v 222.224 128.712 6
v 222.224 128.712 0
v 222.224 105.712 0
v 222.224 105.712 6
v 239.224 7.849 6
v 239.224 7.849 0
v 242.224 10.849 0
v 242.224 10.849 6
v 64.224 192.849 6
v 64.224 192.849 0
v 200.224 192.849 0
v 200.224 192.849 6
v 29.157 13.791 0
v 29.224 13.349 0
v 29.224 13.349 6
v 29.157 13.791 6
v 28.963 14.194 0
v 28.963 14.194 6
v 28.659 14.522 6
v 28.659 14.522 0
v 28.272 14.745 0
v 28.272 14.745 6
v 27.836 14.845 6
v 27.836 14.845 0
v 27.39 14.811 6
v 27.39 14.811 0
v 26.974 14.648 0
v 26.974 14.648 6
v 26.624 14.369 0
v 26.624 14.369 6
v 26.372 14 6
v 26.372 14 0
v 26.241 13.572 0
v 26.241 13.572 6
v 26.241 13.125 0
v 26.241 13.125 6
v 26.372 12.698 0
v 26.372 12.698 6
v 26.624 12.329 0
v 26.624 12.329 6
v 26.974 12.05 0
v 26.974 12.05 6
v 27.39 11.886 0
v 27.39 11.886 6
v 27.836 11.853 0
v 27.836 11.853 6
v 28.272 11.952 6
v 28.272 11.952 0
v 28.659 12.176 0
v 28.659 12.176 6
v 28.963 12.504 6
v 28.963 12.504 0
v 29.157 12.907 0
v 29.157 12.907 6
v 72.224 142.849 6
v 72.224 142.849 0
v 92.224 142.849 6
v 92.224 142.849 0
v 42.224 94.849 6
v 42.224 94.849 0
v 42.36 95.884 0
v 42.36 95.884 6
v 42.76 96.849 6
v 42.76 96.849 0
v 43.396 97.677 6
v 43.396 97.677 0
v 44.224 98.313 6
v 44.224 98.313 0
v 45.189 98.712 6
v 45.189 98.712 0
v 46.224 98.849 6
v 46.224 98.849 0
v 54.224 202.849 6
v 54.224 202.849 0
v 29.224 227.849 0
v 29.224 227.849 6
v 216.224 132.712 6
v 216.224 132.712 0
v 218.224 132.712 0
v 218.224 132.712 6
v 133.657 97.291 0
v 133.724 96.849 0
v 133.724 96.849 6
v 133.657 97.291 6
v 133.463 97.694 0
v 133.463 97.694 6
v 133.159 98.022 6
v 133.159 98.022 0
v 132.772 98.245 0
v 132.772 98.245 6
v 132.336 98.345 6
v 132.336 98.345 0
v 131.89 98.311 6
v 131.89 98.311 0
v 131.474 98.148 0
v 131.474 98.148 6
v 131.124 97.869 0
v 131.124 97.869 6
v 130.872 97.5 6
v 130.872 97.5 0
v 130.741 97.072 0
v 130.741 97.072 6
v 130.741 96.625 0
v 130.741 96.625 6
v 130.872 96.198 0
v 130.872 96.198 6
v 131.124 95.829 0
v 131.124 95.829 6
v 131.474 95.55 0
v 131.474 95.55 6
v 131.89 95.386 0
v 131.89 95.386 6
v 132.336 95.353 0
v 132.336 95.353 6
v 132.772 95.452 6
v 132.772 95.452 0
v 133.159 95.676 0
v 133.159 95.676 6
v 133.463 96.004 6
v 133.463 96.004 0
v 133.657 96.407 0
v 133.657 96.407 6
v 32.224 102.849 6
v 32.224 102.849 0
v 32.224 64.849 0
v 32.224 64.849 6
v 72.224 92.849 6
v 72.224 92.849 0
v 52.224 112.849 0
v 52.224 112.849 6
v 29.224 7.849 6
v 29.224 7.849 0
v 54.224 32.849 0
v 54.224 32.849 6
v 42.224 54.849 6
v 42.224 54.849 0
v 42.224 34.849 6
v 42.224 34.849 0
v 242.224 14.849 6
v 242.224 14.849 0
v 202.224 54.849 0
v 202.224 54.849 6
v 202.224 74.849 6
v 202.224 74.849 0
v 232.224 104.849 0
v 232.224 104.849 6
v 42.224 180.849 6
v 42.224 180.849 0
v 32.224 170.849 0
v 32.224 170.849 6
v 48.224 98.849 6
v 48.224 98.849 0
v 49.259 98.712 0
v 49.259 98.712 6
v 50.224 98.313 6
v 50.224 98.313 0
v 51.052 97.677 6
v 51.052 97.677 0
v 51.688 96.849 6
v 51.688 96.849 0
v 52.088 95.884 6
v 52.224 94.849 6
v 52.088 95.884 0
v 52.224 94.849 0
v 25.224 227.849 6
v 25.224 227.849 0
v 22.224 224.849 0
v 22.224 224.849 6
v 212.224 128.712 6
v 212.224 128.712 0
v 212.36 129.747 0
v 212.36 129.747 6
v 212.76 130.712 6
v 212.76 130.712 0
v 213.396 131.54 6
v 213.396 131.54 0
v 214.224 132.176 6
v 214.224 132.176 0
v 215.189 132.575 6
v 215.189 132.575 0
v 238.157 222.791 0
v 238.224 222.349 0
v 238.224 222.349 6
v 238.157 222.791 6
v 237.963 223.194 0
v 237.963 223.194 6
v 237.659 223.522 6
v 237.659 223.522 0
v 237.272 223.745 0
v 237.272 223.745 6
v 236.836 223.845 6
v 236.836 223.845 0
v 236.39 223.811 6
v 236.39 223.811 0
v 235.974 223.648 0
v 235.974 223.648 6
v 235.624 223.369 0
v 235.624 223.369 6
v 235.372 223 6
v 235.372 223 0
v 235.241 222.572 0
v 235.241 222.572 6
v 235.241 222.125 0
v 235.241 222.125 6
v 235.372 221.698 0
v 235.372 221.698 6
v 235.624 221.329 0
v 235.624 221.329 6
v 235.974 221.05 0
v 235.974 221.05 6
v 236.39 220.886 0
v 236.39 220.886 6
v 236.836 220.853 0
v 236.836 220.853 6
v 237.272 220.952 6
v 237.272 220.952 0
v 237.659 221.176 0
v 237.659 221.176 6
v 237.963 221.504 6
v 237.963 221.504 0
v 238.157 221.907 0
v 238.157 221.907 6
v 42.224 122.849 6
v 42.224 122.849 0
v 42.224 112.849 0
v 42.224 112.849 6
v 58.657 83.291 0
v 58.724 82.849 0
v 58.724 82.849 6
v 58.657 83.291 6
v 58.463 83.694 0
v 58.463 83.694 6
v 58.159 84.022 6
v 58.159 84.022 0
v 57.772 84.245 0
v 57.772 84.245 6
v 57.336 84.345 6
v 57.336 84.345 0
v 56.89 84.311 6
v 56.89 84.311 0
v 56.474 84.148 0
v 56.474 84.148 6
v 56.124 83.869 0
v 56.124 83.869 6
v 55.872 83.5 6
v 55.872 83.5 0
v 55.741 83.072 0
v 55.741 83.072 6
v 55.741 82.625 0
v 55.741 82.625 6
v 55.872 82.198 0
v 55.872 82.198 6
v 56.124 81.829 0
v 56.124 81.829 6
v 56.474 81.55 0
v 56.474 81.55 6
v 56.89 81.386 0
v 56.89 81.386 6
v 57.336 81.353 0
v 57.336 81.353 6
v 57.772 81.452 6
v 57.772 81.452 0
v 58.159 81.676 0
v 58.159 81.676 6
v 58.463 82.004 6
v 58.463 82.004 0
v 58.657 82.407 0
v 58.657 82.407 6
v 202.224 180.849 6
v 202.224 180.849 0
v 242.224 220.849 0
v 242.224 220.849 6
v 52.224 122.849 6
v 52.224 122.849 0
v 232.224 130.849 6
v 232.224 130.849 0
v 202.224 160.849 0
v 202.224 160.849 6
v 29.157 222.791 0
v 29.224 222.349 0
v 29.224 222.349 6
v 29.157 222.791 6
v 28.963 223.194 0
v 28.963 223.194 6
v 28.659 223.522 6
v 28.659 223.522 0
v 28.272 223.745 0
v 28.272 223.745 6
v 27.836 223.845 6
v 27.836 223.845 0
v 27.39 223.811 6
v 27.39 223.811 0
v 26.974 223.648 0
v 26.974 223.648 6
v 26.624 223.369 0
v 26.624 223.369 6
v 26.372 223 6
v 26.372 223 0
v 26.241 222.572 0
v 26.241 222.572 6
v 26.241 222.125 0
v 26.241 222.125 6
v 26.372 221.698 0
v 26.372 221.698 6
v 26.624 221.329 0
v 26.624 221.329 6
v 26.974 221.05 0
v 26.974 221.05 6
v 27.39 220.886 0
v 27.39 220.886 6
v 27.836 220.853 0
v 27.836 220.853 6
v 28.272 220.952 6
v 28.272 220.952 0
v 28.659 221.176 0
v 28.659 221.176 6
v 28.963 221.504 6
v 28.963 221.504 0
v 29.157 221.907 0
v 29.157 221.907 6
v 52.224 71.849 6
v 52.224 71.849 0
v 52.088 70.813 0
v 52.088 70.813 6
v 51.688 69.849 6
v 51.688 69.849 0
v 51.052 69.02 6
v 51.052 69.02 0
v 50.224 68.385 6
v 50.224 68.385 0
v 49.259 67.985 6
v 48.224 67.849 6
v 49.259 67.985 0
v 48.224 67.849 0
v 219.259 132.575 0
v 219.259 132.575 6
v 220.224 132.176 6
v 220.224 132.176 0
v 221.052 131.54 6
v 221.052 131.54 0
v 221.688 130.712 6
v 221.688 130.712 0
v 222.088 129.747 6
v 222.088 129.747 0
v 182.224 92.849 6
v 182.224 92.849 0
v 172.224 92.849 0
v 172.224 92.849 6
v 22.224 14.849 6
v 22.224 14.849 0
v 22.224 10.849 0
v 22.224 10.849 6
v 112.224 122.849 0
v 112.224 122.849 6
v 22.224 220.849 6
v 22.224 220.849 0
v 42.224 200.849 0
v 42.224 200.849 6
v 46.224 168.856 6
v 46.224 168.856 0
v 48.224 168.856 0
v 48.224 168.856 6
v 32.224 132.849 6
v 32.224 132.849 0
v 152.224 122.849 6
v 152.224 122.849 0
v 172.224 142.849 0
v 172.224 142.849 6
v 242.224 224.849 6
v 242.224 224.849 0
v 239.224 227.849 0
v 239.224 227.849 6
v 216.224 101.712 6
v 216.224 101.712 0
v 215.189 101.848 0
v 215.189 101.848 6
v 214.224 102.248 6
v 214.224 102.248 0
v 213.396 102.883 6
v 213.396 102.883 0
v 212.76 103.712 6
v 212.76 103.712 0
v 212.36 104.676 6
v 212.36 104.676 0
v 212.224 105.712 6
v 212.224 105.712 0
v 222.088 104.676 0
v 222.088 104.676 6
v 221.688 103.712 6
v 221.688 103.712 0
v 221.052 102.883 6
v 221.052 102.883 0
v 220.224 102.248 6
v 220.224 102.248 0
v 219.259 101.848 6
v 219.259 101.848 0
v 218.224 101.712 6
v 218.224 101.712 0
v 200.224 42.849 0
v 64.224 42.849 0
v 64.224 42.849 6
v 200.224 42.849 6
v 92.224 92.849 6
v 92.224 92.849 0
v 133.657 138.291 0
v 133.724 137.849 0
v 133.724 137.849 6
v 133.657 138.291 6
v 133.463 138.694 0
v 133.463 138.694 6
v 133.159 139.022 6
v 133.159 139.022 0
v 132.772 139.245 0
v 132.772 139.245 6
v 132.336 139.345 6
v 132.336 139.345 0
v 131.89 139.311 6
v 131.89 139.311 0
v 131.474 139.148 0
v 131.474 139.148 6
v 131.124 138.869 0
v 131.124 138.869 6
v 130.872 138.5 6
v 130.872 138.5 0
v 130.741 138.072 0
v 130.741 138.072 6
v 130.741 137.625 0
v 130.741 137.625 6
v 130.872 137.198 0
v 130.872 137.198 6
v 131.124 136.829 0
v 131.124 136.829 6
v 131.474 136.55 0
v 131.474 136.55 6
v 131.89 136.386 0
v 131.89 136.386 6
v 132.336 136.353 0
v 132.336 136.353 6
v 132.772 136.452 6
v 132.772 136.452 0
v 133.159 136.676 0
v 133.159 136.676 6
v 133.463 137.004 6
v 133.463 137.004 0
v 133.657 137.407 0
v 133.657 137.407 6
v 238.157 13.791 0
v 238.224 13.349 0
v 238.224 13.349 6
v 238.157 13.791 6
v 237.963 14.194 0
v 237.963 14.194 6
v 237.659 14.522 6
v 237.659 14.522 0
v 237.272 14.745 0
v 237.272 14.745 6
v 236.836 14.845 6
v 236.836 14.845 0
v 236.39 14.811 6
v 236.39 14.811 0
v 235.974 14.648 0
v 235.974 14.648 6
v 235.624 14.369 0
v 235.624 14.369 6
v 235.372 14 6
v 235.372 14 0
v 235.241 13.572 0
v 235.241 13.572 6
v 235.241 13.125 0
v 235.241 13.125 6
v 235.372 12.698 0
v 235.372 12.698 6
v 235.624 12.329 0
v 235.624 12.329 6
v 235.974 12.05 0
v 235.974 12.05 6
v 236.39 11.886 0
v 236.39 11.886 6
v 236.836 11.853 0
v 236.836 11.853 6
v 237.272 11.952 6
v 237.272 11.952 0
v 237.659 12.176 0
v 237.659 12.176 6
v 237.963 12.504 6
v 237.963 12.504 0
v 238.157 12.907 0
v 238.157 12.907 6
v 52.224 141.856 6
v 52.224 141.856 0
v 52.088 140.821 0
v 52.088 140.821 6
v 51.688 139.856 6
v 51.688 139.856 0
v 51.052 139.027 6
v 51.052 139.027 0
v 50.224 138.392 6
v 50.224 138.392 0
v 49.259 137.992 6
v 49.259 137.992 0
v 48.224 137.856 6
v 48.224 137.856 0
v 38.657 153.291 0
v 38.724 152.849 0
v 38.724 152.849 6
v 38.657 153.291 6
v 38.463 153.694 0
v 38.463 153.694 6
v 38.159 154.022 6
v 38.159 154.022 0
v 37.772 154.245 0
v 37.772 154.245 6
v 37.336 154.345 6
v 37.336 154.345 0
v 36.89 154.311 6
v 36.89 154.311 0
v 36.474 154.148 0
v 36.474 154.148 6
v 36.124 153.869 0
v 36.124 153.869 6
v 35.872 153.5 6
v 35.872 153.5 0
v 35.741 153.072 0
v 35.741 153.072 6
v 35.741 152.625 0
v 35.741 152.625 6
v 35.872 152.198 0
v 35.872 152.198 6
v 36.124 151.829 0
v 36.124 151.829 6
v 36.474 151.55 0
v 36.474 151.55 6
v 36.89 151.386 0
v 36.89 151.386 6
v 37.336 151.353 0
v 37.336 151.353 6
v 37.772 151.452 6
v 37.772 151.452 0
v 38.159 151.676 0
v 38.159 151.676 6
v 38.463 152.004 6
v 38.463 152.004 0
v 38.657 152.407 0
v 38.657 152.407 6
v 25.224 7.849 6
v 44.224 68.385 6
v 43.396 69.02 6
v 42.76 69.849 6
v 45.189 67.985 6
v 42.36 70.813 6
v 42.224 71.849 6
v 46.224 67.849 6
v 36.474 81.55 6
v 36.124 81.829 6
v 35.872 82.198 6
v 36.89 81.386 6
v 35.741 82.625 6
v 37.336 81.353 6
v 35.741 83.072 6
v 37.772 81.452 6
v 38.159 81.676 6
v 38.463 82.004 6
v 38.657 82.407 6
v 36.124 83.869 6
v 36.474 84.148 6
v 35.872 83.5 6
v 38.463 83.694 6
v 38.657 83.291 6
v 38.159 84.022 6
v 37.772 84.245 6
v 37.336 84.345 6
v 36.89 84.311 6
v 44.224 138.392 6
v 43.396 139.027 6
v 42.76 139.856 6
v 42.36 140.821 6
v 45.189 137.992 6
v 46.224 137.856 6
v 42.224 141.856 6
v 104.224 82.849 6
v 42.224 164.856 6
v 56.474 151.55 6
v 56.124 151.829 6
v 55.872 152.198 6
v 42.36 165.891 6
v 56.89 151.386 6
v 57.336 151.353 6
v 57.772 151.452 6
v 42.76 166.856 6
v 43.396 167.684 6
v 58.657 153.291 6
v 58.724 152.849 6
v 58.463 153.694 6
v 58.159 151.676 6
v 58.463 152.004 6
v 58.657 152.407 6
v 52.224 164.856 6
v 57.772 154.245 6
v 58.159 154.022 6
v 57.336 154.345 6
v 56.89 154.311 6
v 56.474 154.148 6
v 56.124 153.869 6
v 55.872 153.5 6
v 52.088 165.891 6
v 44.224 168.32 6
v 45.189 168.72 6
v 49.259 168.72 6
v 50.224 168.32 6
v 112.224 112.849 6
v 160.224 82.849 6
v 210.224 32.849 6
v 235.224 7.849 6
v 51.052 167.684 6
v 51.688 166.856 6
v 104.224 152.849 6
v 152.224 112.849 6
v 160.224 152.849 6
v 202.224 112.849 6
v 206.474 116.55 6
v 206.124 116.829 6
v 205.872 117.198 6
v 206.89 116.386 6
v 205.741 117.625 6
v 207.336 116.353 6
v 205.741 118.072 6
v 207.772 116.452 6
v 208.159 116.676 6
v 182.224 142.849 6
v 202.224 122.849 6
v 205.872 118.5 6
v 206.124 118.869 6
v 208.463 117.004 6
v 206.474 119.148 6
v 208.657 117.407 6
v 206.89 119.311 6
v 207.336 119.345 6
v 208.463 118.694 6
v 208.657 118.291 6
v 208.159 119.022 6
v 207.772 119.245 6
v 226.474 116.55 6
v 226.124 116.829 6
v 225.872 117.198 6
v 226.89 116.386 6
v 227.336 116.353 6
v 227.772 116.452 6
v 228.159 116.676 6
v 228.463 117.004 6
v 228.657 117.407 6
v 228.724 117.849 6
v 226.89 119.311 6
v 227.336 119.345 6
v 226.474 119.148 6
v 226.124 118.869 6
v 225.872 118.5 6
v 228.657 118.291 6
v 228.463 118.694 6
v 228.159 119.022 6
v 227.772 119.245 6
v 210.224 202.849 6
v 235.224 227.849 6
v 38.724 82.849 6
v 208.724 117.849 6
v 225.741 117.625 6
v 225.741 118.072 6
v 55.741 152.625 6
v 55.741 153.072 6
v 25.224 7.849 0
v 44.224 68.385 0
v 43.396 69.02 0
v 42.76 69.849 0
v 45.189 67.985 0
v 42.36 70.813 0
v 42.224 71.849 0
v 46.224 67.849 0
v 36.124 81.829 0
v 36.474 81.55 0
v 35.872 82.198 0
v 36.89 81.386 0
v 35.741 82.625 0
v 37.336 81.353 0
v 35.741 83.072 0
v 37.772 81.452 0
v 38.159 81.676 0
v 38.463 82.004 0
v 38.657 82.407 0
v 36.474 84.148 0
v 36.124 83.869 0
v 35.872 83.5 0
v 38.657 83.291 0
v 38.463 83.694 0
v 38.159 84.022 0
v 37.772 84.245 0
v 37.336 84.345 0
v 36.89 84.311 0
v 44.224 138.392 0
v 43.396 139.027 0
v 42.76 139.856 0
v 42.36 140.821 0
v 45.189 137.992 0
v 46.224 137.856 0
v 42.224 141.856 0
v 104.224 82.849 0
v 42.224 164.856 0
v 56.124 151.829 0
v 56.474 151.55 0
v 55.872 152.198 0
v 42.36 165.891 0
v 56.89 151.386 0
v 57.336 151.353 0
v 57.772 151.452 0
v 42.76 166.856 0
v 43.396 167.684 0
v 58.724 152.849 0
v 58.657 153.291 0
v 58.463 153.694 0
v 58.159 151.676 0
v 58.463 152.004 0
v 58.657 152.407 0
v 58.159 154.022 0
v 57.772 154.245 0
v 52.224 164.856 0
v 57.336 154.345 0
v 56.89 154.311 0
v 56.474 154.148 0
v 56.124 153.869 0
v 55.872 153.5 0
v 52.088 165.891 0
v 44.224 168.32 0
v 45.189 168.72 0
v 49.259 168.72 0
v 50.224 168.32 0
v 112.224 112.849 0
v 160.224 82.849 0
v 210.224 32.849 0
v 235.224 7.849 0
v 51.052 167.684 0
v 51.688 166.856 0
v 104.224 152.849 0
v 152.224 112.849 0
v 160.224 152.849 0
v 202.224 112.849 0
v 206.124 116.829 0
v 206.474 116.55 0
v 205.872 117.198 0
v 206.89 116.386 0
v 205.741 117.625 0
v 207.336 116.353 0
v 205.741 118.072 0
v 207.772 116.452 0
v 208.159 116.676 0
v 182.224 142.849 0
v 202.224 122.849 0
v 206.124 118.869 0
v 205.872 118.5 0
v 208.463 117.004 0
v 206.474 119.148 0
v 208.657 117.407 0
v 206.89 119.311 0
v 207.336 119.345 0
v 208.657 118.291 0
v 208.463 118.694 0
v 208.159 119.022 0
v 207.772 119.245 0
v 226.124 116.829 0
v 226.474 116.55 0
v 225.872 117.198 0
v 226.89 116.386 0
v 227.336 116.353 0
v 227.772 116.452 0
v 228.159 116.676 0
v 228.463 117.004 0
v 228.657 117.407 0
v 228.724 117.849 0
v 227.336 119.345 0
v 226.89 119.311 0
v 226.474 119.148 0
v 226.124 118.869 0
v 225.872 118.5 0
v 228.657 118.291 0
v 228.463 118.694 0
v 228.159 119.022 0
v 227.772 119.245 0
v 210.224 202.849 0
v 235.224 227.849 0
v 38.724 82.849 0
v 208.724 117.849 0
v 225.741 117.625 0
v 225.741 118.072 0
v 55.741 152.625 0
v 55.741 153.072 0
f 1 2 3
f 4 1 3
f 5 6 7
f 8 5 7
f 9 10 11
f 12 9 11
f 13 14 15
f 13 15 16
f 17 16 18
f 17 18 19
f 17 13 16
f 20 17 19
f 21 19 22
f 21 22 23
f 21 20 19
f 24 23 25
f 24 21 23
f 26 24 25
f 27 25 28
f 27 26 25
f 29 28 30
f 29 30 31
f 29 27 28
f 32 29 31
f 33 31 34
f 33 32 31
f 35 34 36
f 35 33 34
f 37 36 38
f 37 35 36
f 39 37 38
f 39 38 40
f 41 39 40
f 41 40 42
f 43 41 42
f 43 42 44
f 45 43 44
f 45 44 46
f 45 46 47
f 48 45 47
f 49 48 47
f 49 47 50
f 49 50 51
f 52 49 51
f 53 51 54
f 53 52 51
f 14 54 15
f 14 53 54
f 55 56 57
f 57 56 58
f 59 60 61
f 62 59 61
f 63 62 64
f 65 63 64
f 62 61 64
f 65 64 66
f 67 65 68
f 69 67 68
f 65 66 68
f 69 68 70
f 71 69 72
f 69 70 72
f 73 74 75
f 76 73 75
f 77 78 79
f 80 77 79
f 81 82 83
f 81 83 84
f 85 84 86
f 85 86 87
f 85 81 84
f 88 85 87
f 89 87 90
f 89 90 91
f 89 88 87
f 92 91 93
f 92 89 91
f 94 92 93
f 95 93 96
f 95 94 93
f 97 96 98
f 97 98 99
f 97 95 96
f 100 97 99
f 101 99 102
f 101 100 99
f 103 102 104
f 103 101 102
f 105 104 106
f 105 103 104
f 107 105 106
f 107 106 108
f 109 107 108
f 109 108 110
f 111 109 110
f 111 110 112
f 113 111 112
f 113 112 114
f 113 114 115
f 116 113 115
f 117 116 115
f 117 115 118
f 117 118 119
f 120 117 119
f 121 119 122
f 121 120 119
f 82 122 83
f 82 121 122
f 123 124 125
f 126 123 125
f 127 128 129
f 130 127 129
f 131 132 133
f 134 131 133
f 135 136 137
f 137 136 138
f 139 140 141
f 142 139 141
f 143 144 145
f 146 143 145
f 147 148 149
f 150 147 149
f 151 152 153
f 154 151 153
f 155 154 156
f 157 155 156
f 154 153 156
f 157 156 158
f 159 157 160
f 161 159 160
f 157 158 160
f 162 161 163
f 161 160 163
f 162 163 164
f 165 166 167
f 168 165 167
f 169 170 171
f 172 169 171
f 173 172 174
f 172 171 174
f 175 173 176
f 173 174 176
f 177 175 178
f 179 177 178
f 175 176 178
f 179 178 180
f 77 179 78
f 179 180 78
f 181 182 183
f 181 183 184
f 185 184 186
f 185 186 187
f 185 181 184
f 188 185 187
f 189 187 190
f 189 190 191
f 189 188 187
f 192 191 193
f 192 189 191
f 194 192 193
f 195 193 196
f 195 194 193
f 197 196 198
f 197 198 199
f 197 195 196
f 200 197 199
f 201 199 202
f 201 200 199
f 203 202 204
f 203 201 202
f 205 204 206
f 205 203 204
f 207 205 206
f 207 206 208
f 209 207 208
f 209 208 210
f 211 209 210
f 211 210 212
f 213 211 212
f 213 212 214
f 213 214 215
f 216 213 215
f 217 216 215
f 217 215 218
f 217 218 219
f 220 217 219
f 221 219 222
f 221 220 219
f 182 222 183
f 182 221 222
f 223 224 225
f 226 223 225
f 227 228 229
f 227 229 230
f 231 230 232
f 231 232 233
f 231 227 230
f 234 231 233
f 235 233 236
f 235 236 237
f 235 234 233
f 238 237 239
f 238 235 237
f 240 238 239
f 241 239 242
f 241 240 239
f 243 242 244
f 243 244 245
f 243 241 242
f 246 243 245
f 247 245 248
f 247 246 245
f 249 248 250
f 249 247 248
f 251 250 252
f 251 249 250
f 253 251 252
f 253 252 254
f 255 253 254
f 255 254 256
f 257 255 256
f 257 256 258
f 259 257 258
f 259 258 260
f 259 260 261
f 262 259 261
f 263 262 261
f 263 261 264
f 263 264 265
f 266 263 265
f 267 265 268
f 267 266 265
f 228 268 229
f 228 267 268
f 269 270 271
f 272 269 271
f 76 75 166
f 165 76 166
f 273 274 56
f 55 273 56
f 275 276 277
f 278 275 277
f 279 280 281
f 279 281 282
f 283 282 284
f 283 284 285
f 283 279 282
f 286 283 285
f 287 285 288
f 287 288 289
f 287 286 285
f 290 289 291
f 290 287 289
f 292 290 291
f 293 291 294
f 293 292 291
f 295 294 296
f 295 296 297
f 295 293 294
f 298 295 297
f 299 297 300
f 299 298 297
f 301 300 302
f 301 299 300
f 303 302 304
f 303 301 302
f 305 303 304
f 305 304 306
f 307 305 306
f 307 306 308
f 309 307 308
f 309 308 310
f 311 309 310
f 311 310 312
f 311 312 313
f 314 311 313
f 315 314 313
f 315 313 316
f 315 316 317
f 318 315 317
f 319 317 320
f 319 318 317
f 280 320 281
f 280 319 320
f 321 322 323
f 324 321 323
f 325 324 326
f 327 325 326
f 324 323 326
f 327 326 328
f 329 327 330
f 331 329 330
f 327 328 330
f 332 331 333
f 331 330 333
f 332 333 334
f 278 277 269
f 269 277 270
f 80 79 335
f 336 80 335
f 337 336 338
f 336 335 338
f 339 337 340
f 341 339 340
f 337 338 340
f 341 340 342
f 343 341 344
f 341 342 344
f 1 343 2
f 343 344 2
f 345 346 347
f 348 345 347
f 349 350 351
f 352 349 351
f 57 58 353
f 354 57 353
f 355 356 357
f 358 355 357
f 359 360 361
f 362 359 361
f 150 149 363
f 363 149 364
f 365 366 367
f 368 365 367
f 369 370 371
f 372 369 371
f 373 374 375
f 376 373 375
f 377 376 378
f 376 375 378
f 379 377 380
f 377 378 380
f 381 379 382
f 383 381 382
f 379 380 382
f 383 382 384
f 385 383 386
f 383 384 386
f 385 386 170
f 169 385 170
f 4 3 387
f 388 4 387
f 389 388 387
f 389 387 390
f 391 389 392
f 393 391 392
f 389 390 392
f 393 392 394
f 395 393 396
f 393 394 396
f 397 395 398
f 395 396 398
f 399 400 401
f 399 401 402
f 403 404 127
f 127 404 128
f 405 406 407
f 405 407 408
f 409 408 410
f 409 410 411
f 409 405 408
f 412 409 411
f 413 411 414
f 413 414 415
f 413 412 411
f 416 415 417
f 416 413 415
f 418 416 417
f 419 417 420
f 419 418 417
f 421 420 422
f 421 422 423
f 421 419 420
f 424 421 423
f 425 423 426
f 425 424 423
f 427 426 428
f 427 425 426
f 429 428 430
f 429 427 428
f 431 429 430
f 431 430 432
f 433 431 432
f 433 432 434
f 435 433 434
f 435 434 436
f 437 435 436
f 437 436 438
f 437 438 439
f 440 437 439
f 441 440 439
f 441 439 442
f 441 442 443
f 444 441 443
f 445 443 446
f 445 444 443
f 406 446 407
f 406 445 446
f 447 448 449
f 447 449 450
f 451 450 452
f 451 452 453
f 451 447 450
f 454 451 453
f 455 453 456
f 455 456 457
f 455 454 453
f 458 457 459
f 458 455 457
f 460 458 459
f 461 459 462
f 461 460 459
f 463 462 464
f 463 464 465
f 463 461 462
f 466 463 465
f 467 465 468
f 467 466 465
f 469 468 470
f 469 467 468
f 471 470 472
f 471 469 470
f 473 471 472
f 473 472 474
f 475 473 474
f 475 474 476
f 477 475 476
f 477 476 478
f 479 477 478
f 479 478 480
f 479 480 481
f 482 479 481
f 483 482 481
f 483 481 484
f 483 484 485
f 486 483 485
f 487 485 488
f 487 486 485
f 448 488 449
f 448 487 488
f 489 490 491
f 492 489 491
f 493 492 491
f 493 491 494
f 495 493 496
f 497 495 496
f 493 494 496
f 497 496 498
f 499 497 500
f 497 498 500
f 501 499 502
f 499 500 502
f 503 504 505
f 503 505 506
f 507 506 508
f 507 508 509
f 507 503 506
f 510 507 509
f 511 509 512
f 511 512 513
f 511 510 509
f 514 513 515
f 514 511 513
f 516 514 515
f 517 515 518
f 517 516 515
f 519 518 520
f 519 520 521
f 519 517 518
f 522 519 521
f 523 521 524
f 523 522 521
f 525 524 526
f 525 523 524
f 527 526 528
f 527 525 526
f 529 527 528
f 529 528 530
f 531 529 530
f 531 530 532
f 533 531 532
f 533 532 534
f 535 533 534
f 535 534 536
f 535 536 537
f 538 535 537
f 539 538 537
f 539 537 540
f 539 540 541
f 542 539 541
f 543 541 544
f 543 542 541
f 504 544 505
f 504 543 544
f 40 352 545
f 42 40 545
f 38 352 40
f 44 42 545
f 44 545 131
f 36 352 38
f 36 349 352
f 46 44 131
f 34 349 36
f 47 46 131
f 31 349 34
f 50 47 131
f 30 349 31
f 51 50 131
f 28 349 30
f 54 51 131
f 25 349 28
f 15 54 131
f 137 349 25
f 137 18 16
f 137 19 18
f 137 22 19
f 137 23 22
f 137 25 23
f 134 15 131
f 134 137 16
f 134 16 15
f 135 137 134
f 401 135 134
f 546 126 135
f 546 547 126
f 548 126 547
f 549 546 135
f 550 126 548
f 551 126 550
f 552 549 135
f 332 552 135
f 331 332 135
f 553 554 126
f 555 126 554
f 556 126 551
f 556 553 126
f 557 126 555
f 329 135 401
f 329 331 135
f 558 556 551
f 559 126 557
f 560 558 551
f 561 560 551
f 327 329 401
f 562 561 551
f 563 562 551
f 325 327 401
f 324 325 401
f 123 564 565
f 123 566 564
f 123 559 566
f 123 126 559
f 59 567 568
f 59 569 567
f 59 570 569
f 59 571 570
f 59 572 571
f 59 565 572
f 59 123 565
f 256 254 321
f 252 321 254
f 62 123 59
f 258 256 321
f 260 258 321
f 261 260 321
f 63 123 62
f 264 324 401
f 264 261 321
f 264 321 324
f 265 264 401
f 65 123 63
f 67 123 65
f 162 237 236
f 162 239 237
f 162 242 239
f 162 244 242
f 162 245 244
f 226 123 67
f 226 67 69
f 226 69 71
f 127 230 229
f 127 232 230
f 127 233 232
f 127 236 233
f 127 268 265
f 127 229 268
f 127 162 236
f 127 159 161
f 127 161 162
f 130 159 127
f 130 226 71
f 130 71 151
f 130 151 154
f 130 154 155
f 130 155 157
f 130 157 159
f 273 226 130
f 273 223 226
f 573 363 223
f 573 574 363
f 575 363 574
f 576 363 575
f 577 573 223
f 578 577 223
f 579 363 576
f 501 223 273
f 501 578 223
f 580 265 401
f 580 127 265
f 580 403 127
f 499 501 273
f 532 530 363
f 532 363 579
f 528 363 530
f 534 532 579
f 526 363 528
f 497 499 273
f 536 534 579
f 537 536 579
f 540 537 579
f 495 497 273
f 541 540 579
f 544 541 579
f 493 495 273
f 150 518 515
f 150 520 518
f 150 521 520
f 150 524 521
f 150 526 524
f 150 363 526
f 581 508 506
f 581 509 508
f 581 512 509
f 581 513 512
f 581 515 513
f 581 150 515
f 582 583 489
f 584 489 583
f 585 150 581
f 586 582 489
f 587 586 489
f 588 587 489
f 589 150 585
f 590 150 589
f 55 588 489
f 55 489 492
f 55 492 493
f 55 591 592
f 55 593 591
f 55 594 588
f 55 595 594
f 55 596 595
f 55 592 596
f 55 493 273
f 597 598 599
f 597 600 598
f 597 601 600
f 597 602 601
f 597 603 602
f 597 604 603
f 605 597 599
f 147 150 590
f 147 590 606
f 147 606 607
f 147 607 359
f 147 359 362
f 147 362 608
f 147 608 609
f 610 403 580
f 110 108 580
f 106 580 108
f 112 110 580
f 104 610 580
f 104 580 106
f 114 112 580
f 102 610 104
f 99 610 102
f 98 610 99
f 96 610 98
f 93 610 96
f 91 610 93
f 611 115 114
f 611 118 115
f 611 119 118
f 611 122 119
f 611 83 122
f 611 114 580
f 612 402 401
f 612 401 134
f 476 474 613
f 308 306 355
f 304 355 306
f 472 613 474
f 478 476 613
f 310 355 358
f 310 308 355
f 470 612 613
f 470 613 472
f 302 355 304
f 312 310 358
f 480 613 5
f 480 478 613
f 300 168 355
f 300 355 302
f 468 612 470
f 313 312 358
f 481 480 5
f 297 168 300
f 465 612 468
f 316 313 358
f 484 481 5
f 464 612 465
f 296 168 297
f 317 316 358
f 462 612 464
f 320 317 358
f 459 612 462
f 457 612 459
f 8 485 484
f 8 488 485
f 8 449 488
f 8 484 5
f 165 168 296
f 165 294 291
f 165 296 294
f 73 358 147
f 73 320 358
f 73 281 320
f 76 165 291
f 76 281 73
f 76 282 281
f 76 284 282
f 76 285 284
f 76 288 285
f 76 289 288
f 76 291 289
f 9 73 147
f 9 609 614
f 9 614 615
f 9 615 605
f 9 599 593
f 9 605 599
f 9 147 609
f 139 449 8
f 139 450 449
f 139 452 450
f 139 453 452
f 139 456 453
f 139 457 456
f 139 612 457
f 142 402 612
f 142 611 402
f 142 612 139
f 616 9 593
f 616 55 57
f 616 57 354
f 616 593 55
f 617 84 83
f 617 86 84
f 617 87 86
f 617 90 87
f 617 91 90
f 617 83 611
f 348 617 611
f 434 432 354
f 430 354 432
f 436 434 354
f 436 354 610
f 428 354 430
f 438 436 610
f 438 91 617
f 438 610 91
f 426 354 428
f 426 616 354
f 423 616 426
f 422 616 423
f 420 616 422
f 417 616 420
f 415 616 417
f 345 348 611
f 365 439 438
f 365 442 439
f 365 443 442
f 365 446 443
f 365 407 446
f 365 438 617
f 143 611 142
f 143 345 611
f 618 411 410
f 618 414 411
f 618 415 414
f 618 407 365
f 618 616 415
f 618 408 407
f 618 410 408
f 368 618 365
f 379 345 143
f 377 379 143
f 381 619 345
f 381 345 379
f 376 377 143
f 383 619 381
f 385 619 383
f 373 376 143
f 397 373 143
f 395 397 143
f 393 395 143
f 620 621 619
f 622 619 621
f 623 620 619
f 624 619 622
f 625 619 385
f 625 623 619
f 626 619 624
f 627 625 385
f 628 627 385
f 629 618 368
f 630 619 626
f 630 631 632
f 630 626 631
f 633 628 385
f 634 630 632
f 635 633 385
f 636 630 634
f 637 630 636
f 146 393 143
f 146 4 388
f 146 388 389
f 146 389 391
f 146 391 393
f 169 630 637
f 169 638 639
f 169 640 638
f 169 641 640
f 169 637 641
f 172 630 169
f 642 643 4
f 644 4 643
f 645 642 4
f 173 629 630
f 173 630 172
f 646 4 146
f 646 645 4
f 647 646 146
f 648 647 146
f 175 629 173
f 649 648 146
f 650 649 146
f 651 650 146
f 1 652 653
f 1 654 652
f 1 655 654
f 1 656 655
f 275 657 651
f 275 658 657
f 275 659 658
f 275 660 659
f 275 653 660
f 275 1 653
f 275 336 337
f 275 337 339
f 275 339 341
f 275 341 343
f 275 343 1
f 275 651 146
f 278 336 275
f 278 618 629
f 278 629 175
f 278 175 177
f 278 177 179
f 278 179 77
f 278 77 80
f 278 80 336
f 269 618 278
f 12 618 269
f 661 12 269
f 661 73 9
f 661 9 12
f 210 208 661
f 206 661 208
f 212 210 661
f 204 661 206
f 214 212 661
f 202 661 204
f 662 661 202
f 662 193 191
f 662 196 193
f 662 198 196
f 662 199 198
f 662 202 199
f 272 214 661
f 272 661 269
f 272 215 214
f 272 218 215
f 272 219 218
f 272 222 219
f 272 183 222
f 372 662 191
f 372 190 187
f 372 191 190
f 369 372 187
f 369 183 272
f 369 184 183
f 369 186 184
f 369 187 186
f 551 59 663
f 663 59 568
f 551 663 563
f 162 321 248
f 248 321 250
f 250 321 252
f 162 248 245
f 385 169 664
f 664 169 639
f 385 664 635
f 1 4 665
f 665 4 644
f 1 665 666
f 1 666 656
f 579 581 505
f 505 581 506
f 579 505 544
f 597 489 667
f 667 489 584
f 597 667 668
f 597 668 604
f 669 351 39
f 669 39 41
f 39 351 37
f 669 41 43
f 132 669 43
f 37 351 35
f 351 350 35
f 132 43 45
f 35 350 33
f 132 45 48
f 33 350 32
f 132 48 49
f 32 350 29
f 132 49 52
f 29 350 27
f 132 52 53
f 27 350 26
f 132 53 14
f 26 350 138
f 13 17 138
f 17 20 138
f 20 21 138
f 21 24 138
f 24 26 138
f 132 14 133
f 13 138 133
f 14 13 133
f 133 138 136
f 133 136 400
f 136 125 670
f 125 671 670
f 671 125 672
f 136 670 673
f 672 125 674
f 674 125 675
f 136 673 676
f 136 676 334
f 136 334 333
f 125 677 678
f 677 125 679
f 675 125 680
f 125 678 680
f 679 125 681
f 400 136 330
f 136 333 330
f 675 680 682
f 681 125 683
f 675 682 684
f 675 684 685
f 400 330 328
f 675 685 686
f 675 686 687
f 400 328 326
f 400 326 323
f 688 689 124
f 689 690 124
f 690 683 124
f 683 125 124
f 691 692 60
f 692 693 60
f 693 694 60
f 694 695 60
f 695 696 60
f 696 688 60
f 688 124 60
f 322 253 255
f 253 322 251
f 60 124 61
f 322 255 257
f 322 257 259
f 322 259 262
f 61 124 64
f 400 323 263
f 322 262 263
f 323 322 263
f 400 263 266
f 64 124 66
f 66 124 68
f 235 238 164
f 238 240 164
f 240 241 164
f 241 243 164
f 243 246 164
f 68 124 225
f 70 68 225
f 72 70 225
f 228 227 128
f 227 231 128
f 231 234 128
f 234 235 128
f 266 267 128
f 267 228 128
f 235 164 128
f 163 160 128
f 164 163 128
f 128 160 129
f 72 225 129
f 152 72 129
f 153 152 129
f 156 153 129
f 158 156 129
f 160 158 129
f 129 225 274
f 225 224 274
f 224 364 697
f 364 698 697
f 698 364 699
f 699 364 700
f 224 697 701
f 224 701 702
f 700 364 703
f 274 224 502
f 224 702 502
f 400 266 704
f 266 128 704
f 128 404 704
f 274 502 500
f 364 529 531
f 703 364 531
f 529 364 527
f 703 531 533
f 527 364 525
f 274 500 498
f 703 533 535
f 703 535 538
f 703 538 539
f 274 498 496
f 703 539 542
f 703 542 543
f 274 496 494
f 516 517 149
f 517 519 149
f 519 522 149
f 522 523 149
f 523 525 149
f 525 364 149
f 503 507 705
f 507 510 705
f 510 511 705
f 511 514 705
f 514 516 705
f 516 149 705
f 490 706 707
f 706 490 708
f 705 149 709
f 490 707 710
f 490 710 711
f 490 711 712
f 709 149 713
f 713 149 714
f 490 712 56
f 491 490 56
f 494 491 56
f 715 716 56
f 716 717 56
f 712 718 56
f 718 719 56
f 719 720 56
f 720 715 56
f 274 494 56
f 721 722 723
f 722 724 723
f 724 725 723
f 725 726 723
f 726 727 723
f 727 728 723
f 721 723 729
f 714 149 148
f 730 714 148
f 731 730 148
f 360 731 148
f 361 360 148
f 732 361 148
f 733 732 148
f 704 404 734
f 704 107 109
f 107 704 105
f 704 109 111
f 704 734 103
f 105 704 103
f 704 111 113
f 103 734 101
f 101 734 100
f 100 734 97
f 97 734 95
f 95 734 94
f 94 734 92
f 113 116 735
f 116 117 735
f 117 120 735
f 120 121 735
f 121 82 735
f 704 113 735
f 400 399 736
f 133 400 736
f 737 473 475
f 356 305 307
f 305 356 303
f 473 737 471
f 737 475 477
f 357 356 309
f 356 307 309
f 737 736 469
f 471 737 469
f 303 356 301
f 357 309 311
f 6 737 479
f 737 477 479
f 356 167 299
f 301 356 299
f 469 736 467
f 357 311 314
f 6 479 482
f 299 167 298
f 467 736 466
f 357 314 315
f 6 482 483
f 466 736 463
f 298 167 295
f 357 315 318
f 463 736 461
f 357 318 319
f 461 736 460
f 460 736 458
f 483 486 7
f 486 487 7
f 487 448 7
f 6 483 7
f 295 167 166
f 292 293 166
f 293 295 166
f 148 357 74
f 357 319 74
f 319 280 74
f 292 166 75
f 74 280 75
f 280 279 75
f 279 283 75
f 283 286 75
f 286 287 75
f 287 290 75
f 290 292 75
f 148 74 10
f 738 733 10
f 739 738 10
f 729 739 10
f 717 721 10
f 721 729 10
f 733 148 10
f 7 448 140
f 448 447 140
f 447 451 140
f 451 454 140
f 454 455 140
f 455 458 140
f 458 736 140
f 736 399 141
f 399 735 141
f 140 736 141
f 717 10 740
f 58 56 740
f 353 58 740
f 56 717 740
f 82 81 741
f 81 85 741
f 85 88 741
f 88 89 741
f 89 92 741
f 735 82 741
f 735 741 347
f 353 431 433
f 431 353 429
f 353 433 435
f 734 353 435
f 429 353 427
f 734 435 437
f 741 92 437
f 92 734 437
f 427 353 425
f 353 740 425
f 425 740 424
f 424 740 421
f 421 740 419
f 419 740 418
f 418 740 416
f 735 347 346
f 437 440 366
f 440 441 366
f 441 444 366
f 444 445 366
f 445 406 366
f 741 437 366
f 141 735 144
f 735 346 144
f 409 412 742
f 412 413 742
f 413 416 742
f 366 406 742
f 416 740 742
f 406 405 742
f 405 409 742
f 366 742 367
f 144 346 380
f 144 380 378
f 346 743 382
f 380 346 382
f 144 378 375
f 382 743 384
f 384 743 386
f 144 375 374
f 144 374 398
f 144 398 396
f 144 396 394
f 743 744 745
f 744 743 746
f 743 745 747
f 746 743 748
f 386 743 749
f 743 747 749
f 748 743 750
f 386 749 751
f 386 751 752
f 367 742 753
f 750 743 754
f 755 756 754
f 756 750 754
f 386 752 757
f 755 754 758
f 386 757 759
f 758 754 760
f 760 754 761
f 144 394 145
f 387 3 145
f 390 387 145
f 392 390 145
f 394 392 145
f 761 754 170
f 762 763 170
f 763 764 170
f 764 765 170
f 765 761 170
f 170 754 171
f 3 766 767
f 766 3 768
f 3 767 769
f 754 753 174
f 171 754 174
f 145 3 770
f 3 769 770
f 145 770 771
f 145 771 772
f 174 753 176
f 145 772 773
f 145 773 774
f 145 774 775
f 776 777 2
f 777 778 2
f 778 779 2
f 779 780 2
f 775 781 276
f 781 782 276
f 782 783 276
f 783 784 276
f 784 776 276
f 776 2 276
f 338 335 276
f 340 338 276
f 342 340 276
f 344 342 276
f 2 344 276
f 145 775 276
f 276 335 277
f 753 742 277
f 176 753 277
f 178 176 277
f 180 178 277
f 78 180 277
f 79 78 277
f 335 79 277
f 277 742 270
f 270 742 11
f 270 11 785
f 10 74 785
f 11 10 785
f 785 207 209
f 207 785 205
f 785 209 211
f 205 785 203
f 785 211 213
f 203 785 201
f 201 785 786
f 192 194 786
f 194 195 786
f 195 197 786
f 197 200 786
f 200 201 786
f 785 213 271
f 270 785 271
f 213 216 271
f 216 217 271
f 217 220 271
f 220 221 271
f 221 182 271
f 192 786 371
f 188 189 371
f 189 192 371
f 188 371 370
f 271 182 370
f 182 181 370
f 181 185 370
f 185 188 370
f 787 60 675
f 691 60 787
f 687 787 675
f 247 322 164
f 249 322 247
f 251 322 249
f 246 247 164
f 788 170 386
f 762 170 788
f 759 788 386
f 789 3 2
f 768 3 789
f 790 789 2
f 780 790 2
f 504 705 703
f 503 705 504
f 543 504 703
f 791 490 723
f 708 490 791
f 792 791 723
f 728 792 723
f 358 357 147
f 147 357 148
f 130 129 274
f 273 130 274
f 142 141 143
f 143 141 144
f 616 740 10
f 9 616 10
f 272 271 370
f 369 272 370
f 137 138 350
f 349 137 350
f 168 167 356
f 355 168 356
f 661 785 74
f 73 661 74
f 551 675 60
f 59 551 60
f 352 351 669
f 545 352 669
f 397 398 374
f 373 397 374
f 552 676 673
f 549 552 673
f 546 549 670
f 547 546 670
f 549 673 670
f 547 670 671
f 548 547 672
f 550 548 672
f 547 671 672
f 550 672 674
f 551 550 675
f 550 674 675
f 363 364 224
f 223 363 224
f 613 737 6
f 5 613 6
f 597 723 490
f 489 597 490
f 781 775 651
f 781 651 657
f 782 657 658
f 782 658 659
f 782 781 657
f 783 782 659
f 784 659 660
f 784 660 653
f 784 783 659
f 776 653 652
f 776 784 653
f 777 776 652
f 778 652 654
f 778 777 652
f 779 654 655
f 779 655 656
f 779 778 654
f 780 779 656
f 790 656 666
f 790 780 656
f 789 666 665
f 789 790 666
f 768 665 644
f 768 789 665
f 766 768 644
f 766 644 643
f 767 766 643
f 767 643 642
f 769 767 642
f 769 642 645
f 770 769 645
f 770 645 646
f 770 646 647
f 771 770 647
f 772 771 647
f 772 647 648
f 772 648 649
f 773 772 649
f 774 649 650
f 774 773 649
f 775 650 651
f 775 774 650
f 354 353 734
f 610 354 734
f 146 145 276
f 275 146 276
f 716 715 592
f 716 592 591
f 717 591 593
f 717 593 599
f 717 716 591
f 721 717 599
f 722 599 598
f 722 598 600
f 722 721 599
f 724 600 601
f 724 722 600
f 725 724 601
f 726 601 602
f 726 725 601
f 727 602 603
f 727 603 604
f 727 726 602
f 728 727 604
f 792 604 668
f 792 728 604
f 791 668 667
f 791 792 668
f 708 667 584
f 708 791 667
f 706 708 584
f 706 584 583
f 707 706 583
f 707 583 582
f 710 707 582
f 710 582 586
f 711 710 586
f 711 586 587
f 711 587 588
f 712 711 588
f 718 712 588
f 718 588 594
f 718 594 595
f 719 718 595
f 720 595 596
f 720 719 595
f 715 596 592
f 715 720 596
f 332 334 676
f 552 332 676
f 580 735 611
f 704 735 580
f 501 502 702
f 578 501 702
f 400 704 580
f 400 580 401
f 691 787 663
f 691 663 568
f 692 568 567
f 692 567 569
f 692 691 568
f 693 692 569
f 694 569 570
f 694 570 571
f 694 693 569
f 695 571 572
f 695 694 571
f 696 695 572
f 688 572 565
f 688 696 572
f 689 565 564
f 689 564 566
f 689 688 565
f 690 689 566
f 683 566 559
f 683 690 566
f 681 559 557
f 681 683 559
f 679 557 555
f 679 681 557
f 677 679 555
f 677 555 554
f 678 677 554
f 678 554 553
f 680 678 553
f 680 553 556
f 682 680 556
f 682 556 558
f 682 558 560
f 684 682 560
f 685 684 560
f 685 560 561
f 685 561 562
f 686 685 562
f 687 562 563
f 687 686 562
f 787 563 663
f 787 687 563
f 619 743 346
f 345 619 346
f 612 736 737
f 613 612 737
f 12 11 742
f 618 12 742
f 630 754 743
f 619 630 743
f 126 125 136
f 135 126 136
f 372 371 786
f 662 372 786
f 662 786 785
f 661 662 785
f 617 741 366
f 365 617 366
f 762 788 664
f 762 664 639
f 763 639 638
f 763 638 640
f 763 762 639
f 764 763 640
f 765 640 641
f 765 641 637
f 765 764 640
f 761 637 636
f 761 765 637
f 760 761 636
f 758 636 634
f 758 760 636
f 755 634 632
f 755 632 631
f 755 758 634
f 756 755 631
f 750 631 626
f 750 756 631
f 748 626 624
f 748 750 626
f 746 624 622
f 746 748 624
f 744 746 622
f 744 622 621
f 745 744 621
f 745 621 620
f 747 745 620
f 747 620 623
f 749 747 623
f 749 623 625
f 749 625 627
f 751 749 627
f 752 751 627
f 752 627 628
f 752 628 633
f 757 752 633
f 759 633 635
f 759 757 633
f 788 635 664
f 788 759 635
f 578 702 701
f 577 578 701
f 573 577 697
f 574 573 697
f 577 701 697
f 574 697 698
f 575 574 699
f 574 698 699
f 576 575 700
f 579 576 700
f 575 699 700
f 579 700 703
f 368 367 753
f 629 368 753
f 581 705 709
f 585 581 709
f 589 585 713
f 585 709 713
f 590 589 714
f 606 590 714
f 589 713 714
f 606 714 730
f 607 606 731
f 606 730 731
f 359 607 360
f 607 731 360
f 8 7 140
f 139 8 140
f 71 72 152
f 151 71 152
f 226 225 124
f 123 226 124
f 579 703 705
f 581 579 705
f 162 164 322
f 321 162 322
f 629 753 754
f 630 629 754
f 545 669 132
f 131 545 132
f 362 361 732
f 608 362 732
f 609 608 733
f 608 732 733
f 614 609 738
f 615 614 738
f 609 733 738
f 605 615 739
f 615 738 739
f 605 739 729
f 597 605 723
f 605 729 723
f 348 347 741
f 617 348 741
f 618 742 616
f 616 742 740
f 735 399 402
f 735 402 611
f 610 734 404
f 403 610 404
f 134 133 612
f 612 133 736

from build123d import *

# Parameters (mm, degrees)
MODEL_R                  = 1.5
RESSALTO_EXTRUS_O1_DEPTH = 6


with BuildPart() as part:
    # Model → Ressalto-extrusão1 (new body)
    with BuildSketch(Plane.XY):
        Polygon((27.223932907, 227.848775031), (25.223932907, 227.848775031), (22.223932907, 224.848775031), (22.223932907, 222.848775031), (22.223932907, 220.848775031), (42.223932907, 200.848775031), (42.223932907, 180.848775031), (32.223932907, 170.848775031), (32.223932907, 132.848775031), (42.223932907, 122.848775031), (42.223932907, 112.848775031), (32.223932907, 102.848775031), (32.223932907, 64.848775031), (42.223932907, 54.848775031), (42.223932907, 34.848775031), (22.223932907, 14.848775031), (22.223932907, 10.848775031), (25.223932907, 7.848775031), (27.223932907, 7.848775031), (29.223932907, 7.848775031), (54.223932907, 32.848775031), (210.223932907, 32.848775031), (235.223932907, 7.848775031), (237.223932907, 7.848775031), (239.223932907, 7.848775031), (242.223932907, 10.848775031), (242.223932907, 14.848775031), (222.223932907, 34.848775031), (202.223932907, 54.848775031), (202.223932907, 74.848775031), (222.223932907, 94.848775031), (232.223932907, 104.848775031), (232.223932907, 130.848775031), (222.223932907, 140.848775031), (202.223932907, 160.848775031), (202.223932907, 180.848775031), (242.223932907, 220.848775031), (242.223932907, 223.848775031), (242.223932907, 224.848775031), (239.223932907, 227.848775031), (235.223932907, 227.848775031), (212.223932907, 204.848775031), (210.223932907, 202.848775031), (54.223932907, 202.848775031), (29.223932907, 227.848775031), align=None)
        with Locations((37.223932907, 152.848775031)):
            Circle(MODEL_R, mode=Mode.SUBTRACT)
        with Locations((57.223932907, 152.848775031)):
            Circle(MODEL_R, mode=Mode.SUBTRACT)
        with Locations((37.223932907, 82.848775031)):
            Circle(MODEL_R, mode=Mode.SUBTRACT)
        with Locations((57.223932907, 82.848775031)):
            Circle(MODEL_R, mode=Mode.SUBTRACT)
        with Locations((227.223932907, 117.848775031)):
            Circle(MODEL_R, mode=Mode.SUBTRACT)
        with Locations((207.223932907, 117.848775031)):
            Circle(MODEL_R, mode=Mode.SUBTRACT)
        with Locations((27.723932907, 222.348775031)):
            Circle(MODEL_R, mode=Mode.SUBTRACT)
        with Locations((236.723932907, 13.348775031)):
            Circle(MODEL_R, mode=Mode.SUBTRACT)
        with Locations((236.723932907, 222.348775031)):
            Circle(MODEL_R, mode=Mode.SUBTRACT)
        with Locations((27.723932907, 13.348775031)):
            Circle(MODEL_R, mode=Mode.SUBTRACT)
        with Locations((132.223932907, 96.848775031)):
            Circle(MODEL_R, mode=Mode.SUBTRACT)
        with Locations((132.223932907, 137.848775031)):
            Circle(MODEL_R, mode=Mode.SUBTRACT)
        Polygon((172.223932907, 164.848775031), (170.223932907, 162.848775031), (160.223932907, 152.848775031), (104.223932907, 152.848775031), (64.223932907, 192.848775031), (200.223932907, 192.848775031), align=None, mode=Mode.SUBTRACT)
        Polygon((160.223932907, 82.848775031), (104.223932907, 82.848775031), (64.223932907, 42.848775031), (200.223932907, 42.848775031), align=None, mode=Mode.SUBTRACT)
        Polygon((52.223932907, 122.848775031), (72.223932907, 142.848775031), (92.223932907, 142.848775031), (112.223932907, 122.848775031), (112.223932907, 112.848775031), (92.223932907, 92.848775031), (72.223932907, 92.848775031), (52.223932907, 112.848775031), align=None, mode=Mode.SUBTRACT)
        Polygon((182.223932907, 142.848775031), (202.223932907, 122.848775031), (202.223932907, 112.848775031), (182.223932907, 92.848775031), (172.223932907, 92.848775031), (152.223932907, 112.848775031), (152.223932907, 122.848775031), (172.223932907, 142.848775031), align=None, mode=Mode.SUBTRACT)
        with BuildLine():
            Line((42.223932907, 71.848775031), (42.223932907, 94.848775031))
            ThreePointArc((42.223932907, 94.848775031), (43.395505782, 97.677202156), (46.223932907, 98.848775031))
            Line((46.223932907, 98.848775031), (48.223932907, 98.848775031))
            ThreePointArc((48.223932907, 98.848775031), (51.052360031, 97.677202156), (52.223932907, 94.848775031))
            Line((52.223932907, 94.848775031), (52.223932907, 71.848775031))
            ThreePointArc((52.223932907, 71.848775031), (51.052360031, 69.020347906), (48.223932907, 67.848775031))
            Line((48.223932907, 67.848775031), (46.223932907, 67.848775031))
            ThreePointArc((46.223932907, 67.848775031), (43.395505782, 69.020347906), (42.223932907, 71.848775031))
        make_face(mode=Mode.SUBTRACT)
        with BuildLine():
            Line((42.223932907, 141.855811927), (42.223932907, 164.855811927))
            ThreePointArc((42.223932907, 164.855811927), (43.395505782, 167.684239052), (46.223932907, 168.855811927))
            Line((46.223932907, 168.855811927), (48.223932907, 168.855811927))
            ThreePointArc((48.223932907, 168.855811927), (51.052360031, 167.684239052), (52.223932907, 164.855811927))
            Line((52.223932907, 164.855811927), (52.223932907, 141.855811927))
            ThreePointArc((52.223932907, 141.855811927), (51.052360031, 139.027384802), (48.223932907, 137.855811927))
            Line((48.223932907, 137.855811927), (46.223932907, 137.855811927))
            ThreePointArc((46.223932907, 137.855811927), (43.395505782, 139.027384802), (42.223932907, 141.855811927))
        make_face(mode=Mode.SUBTRACT)
        with BuildLine():
            Line((212.223932907, 105.711651424), (212.223932907, 128.711651424))
            ThreePointArc((212.223932907, 128.711651424), (213.395505782, 131.540078549), (216.223932907, 132.711651424))
            Line((216.223932907, 132.711651424), (218.223932907, 132.711651424))
            ThreePointArc((218.223932907, 132.711651424), (221.052360031, 131.540078549), (222.223932907, 128.711651424))
            Line((222.223932907, 128.711651424), (222.223932907, 105.711651424))
            ThreePointArc((222.223932907, 105.711651424), (221.052360031, 102.883224299), (218.223932907, 101.711651424))
            Line((218.223932907, 101.711651424), (216.223932907, 101.711651424))
            ThreePointArc((216.223932907, 101.711651424), (213.395505782, 102.883224299), (212.223932907, 105.711651424))
        make_face(mode=Mode.SUBTRACT)
    extrude(amount=RESSALTO_EXTRUS_O1_DEPTH)


solid = part.part
